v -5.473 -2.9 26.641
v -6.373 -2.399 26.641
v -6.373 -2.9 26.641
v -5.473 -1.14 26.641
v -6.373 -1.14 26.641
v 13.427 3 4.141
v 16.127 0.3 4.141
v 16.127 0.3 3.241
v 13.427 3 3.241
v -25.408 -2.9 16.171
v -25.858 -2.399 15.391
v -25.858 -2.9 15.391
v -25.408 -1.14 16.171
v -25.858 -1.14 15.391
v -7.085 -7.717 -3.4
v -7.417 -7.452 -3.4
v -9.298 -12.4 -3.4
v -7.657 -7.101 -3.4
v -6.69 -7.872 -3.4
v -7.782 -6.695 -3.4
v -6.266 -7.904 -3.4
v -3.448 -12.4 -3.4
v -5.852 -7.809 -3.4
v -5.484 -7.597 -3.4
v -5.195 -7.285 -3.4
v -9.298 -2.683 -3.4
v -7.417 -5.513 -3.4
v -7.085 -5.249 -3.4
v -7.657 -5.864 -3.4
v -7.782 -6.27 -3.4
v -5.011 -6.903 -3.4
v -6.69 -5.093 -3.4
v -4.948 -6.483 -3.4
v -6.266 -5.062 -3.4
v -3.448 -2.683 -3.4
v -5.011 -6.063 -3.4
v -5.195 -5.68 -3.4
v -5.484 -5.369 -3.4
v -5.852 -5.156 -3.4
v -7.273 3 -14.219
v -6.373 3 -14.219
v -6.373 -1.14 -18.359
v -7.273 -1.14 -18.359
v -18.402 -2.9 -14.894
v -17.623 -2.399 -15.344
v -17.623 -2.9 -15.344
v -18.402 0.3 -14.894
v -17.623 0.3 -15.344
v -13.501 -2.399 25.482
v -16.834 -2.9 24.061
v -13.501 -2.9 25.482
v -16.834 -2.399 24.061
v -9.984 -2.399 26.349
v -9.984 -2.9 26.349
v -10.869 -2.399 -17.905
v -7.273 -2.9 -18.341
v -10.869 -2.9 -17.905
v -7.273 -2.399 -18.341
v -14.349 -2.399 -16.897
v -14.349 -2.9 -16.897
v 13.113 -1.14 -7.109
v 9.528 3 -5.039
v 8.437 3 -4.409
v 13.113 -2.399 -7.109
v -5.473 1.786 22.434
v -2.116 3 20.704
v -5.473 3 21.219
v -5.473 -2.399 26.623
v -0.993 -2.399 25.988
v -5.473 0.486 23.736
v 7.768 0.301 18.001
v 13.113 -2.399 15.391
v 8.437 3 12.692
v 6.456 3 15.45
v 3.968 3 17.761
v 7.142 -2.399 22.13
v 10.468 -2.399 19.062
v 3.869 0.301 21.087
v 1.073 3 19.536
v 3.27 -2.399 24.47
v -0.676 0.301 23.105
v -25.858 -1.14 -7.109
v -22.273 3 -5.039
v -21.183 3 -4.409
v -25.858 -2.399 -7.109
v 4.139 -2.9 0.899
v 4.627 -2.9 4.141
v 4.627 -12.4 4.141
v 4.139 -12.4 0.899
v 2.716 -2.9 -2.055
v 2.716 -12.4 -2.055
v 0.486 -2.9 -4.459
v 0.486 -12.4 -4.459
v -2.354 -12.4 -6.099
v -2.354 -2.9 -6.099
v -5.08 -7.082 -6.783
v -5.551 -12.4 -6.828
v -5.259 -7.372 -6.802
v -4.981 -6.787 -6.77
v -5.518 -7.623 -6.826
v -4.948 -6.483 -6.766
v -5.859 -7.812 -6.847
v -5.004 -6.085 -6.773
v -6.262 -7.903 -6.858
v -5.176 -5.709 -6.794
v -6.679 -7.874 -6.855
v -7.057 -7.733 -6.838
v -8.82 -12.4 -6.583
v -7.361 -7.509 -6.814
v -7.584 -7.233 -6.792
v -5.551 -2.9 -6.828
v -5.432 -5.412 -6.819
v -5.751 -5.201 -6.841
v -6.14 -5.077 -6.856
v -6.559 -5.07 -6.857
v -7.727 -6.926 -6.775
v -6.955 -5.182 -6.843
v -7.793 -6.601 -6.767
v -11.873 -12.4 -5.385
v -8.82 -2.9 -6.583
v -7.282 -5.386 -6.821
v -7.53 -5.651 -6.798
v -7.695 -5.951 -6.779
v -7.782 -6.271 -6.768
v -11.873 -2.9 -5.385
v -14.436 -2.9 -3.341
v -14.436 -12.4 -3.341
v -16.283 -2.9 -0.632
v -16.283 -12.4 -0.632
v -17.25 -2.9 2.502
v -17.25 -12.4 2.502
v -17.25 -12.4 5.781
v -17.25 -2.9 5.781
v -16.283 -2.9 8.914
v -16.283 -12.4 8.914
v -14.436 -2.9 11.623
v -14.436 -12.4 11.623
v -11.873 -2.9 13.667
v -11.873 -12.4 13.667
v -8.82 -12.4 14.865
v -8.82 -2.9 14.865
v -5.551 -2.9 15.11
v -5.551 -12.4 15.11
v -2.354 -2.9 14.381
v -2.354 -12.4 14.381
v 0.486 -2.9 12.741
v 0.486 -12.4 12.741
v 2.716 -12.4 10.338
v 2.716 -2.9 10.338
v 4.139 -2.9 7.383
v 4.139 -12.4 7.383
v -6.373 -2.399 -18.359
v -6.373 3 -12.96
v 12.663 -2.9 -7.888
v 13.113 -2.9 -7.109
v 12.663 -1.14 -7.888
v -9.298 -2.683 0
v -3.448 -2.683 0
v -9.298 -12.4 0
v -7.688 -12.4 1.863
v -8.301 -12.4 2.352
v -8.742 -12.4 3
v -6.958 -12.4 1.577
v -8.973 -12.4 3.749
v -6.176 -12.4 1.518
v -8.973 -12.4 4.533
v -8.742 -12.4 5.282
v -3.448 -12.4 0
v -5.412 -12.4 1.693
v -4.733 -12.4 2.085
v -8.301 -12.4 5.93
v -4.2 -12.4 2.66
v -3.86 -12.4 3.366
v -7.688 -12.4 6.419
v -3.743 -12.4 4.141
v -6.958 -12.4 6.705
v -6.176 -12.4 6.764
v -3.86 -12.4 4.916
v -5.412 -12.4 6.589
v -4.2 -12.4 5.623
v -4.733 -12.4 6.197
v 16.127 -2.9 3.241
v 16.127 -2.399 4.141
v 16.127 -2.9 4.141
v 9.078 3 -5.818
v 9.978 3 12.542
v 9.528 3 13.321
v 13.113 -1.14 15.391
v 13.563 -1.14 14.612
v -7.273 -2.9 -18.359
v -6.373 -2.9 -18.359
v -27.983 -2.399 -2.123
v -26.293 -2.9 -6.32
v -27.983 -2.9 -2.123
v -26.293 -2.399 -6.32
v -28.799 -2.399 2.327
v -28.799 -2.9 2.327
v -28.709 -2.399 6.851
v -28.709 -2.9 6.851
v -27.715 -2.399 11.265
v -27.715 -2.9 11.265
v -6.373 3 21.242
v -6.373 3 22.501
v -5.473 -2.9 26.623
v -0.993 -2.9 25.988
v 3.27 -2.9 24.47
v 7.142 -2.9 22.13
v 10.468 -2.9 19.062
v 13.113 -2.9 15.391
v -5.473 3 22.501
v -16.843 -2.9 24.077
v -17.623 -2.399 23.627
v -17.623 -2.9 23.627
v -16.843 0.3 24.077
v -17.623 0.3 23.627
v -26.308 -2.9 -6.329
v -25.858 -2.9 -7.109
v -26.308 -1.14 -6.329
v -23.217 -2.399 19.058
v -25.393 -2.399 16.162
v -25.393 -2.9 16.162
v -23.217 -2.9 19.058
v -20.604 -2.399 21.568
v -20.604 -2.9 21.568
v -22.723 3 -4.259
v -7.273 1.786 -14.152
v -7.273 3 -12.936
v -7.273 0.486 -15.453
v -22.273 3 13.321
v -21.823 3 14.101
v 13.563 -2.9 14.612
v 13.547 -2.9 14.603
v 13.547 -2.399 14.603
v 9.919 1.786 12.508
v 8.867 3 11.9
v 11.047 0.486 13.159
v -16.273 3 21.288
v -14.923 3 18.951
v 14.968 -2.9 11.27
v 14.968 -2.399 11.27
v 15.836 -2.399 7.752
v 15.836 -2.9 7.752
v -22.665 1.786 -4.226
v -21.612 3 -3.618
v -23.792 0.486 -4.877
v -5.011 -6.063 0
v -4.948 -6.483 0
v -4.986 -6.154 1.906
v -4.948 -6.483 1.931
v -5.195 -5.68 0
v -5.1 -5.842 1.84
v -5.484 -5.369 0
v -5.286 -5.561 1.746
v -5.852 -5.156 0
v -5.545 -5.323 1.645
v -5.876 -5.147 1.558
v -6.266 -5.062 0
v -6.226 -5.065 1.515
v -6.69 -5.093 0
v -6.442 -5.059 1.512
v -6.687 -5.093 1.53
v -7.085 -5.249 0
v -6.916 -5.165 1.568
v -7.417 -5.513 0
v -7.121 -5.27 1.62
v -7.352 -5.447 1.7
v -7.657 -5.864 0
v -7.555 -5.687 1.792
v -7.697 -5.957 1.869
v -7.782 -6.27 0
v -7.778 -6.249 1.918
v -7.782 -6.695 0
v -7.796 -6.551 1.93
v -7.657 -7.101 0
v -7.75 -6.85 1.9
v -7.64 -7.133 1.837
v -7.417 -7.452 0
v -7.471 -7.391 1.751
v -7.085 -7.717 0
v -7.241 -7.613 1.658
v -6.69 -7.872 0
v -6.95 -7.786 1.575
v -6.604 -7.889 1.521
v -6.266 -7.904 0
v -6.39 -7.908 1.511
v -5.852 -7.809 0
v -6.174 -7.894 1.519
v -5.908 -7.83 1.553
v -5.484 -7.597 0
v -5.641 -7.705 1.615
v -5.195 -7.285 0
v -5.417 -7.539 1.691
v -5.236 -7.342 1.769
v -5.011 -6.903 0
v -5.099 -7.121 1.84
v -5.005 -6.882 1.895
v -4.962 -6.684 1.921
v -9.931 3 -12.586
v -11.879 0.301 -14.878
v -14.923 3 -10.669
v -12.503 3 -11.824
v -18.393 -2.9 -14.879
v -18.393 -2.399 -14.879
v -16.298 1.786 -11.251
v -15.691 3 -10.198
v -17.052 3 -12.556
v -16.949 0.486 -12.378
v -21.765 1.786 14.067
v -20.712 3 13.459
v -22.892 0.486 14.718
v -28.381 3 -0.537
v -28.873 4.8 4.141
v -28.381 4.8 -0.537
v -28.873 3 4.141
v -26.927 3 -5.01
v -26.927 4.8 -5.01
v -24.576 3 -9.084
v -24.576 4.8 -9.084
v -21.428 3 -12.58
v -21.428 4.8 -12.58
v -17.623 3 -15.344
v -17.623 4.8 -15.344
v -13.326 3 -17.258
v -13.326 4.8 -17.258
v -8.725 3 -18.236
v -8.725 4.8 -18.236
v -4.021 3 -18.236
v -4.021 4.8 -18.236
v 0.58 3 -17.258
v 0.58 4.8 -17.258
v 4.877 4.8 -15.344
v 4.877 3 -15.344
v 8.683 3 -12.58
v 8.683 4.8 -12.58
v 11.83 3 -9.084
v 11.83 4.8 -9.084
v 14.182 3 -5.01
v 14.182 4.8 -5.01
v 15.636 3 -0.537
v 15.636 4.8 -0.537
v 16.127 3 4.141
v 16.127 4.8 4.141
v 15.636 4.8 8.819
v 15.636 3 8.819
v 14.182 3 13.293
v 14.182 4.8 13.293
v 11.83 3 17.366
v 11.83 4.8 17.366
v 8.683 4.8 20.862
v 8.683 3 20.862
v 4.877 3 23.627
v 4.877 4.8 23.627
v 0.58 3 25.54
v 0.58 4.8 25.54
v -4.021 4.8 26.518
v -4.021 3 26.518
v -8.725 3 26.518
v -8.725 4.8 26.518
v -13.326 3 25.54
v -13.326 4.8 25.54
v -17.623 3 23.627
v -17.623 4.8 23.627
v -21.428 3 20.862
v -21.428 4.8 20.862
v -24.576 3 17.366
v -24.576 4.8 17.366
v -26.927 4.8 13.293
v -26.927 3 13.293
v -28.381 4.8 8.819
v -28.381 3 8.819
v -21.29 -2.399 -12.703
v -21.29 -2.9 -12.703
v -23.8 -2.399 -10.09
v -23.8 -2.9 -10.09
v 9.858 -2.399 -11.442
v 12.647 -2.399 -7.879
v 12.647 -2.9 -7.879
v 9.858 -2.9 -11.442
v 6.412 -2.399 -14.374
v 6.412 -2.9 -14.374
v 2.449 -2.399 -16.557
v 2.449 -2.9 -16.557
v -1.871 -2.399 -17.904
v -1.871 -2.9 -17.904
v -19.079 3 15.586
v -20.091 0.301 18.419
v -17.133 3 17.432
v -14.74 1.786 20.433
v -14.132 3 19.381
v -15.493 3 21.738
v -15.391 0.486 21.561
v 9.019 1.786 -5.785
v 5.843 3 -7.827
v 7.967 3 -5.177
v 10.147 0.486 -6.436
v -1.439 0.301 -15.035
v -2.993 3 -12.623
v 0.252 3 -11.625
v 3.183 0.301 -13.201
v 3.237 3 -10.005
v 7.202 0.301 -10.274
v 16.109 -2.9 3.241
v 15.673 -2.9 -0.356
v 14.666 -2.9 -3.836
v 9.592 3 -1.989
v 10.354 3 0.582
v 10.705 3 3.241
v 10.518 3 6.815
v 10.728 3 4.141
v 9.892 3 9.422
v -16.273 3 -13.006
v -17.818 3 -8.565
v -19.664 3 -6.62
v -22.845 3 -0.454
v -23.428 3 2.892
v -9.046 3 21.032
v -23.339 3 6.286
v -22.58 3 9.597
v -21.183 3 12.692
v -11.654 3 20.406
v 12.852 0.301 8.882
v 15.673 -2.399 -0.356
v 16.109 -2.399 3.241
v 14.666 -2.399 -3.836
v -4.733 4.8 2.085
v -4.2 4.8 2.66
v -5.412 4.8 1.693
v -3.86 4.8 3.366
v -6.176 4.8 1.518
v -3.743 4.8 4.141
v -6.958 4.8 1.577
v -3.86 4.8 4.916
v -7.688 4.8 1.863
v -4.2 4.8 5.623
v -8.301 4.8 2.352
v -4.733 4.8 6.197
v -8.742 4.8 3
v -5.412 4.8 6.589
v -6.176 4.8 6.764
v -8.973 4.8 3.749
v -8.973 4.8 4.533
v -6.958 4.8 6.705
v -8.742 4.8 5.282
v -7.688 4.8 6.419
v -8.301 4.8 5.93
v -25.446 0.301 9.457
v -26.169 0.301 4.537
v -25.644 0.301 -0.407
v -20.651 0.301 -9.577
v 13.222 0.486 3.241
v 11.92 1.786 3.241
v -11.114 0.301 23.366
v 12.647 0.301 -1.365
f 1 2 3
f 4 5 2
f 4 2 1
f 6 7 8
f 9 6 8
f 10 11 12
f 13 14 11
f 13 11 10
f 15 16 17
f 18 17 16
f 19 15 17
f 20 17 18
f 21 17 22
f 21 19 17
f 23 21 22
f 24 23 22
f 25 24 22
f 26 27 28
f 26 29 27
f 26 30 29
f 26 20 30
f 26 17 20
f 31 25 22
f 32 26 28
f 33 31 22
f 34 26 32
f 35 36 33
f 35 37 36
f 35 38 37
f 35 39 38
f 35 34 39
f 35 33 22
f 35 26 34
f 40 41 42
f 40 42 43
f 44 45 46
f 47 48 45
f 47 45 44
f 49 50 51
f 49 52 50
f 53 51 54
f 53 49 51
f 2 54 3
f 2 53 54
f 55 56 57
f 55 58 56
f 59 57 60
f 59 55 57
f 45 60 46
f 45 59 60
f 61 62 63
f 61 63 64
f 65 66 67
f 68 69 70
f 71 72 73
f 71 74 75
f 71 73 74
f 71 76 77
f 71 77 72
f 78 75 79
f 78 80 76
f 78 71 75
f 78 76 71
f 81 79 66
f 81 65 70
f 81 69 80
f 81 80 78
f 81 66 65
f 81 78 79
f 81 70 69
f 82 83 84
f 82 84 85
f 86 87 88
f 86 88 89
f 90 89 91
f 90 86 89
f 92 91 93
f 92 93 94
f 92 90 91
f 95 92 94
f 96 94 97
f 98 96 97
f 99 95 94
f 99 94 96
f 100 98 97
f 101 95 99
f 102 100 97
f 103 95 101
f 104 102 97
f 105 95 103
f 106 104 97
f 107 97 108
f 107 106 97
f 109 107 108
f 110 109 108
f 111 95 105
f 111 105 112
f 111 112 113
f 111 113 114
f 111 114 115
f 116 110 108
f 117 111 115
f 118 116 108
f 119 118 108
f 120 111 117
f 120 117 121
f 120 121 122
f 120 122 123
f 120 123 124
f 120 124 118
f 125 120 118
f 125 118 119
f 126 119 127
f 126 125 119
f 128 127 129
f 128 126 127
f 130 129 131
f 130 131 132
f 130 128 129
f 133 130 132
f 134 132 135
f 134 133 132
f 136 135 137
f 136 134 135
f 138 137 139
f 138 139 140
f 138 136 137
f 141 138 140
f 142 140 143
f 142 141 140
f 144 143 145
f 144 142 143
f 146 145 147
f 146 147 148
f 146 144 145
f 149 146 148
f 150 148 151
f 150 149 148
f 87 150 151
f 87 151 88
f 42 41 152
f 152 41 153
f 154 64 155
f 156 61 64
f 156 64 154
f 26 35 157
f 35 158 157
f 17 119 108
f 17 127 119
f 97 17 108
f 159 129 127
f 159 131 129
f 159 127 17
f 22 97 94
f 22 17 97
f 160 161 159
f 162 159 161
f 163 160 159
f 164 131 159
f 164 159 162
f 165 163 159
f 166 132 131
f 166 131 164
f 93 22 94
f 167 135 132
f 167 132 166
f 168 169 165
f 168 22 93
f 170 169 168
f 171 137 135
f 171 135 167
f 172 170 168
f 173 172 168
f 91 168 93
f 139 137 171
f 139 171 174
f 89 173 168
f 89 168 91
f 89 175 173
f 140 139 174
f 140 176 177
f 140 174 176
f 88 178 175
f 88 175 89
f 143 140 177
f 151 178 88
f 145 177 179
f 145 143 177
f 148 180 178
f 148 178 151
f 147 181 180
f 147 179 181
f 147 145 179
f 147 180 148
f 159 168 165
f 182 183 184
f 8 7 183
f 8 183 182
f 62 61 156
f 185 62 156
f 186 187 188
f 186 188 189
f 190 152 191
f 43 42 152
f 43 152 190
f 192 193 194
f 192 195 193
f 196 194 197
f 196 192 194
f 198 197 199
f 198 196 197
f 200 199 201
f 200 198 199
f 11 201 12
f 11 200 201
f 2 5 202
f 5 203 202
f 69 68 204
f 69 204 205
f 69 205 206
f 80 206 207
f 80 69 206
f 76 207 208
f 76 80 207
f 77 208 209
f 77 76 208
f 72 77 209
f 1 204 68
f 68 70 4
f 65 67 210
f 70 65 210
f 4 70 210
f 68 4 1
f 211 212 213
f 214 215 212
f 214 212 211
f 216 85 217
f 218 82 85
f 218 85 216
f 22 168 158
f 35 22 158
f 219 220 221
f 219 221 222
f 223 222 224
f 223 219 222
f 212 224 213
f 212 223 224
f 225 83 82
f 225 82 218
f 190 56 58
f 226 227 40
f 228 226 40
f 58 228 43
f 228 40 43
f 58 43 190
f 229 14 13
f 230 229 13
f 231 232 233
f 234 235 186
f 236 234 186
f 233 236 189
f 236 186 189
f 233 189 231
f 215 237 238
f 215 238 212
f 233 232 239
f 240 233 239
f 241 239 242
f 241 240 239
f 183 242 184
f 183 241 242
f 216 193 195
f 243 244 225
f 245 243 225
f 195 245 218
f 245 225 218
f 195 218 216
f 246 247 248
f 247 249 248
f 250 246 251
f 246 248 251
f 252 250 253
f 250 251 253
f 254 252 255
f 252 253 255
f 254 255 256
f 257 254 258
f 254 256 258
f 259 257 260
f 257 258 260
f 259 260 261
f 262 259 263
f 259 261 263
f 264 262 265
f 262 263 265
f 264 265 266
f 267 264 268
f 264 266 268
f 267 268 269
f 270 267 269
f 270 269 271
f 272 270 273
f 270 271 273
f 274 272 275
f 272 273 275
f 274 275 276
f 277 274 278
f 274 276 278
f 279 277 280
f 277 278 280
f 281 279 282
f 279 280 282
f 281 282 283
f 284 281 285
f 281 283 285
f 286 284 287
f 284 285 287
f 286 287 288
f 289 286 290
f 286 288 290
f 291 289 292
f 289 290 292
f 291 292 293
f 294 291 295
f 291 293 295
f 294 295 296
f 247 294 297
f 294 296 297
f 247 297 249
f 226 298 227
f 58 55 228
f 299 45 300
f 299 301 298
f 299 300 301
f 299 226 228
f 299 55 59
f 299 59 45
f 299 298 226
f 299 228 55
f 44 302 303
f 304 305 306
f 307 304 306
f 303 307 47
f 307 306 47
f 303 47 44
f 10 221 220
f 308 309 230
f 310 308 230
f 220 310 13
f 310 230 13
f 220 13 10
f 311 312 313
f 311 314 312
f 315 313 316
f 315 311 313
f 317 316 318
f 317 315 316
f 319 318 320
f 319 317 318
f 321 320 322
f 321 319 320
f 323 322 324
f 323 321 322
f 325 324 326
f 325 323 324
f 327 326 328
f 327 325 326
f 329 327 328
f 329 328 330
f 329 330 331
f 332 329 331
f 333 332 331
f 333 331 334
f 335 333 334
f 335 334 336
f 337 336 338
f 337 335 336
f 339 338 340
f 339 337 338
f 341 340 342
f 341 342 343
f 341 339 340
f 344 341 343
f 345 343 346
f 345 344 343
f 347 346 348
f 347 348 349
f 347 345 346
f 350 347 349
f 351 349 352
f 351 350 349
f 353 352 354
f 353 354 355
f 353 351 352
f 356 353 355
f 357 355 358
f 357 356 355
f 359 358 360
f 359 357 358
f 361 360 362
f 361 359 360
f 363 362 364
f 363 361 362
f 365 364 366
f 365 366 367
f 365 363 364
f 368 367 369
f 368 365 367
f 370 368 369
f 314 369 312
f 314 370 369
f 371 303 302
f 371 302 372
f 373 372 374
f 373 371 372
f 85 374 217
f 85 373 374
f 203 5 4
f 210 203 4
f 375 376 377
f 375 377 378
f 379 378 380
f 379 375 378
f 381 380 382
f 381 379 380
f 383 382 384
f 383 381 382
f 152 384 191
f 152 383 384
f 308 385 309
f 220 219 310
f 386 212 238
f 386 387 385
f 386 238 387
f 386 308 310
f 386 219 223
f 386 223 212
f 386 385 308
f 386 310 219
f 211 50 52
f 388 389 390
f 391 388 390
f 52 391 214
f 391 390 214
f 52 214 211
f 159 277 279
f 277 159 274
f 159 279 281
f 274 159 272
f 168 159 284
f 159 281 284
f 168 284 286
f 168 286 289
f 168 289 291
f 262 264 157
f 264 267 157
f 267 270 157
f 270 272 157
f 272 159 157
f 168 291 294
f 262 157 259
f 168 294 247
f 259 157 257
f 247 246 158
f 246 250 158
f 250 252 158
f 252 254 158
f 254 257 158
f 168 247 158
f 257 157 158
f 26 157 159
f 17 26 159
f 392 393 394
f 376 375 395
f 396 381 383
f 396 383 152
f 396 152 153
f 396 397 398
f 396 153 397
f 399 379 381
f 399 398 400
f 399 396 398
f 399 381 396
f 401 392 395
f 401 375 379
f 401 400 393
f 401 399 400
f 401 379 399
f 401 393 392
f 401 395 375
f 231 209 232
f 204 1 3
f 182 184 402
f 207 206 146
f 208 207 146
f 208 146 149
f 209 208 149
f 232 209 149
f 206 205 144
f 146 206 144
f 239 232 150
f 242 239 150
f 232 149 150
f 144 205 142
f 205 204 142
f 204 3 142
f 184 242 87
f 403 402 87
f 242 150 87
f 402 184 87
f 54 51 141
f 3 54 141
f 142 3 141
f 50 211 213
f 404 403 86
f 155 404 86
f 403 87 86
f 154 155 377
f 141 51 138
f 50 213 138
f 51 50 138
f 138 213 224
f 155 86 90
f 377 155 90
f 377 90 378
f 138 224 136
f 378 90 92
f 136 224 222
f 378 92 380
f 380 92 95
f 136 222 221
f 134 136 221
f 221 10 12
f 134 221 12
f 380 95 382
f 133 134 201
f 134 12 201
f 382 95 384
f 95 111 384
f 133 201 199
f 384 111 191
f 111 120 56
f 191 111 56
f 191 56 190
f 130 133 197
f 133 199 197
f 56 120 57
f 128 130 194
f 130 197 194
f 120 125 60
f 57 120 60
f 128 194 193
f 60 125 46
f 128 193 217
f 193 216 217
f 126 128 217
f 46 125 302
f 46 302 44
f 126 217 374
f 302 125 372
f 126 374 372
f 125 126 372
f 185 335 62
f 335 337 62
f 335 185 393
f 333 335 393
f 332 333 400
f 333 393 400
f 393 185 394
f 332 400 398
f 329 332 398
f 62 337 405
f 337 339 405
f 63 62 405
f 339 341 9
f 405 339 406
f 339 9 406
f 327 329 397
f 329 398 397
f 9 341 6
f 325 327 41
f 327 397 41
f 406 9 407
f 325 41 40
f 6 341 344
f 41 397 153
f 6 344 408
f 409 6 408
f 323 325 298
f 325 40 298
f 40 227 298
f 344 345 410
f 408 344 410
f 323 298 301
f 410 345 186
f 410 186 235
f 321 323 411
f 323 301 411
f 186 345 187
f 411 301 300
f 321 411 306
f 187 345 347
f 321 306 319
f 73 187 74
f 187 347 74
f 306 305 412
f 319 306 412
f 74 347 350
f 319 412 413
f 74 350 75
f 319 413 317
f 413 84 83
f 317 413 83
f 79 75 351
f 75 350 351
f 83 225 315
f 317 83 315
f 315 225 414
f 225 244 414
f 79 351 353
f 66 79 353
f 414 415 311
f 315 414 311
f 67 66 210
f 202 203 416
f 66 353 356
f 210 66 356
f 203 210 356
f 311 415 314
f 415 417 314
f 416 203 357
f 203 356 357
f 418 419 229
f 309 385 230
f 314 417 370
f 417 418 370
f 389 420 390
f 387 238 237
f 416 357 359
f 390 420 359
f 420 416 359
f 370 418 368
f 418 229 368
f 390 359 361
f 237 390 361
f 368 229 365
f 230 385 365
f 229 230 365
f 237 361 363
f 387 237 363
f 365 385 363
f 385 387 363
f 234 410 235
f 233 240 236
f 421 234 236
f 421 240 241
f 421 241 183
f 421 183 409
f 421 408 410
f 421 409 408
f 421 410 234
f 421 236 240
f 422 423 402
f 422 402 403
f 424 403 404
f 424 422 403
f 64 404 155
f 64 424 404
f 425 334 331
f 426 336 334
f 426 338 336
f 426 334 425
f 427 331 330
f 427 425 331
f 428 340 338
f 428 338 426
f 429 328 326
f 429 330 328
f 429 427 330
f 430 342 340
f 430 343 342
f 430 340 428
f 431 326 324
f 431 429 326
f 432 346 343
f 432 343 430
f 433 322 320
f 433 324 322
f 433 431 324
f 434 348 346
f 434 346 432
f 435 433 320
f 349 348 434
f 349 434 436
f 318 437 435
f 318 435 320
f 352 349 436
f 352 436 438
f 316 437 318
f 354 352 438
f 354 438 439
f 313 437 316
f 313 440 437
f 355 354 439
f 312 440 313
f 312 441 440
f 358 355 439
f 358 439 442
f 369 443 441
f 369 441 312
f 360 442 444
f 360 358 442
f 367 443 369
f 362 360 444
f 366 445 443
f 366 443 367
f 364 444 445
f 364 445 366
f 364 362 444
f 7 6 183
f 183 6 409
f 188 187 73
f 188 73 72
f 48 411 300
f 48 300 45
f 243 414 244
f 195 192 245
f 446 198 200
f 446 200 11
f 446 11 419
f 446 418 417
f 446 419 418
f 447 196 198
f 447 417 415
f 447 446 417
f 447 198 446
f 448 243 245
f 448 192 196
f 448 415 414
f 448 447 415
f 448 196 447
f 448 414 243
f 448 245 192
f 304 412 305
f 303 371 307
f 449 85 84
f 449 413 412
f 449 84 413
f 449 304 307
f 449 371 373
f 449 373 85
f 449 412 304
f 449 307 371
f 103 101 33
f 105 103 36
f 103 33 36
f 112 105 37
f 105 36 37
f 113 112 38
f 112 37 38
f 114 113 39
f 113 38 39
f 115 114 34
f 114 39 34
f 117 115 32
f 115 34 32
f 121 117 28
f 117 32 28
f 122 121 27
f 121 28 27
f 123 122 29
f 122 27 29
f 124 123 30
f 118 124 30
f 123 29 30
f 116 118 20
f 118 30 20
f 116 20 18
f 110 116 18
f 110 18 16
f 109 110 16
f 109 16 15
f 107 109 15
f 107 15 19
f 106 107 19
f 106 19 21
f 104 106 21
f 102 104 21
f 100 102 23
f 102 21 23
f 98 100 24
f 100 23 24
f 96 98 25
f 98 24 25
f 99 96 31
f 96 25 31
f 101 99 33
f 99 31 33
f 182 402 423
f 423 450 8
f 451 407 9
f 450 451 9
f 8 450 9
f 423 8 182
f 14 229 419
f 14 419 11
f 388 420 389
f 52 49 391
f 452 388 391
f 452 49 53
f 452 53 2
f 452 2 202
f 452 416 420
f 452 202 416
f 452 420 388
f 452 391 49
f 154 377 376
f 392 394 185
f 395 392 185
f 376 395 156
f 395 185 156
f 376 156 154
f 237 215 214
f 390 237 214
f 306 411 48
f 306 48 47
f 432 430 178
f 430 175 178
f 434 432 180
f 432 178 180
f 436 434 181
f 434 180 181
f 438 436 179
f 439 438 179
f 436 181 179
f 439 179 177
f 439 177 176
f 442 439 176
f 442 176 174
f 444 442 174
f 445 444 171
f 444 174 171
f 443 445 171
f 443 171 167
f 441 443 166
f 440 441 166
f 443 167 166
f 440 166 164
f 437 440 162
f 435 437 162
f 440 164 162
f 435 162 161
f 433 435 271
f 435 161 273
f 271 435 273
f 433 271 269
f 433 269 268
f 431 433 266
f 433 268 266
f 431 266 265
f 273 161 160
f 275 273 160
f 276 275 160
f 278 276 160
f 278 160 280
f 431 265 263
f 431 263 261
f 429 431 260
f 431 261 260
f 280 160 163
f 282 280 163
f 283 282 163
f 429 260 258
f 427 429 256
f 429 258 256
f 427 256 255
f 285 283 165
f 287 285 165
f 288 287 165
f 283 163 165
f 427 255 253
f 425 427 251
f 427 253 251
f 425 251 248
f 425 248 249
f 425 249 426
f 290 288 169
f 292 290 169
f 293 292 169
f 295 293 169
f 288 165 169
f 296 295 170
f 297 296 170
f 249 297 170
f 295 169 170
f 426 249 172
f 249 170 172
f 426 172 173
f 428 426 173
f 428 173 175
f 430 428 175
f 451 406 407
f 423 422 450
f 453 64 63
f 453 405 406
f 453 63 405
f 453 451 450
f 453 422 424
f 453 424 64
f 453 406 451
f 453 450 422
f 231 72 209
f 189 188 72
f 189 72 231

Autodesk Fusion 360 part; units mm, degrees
sketch "Sketch1" plane through (0, 0, 0) normal (0, 1, 0) x (1, 0, 0)
  circle A0 centre (0, 0) radius 12.5
  dimension "d1" = 25
extrude "Extrude1" add sketch "Sketch1" along normal blind 3 makes body 1
chamfer "Chamfer1" distance 3 angle 45 1 edges at (-11.6541, 3, 4.5202) on bodies 1
sketch "Sketch2" plane through (0, 3, 0) normal (0, 1, 0) x (-1, 0, 0)
  circle A0 centre (0, 0) radius 9.5
  circle A1 centre (0, 0) radius 12.5
  dimension "d5" = 25
extrude "Extrude2" add sketch "Sketch2" along normal blind 1 contours A0 | A1 bodies 1
sketch "Sketch3" plane through (0, 0, 0) normal (0, 0, 1) x (1, 0, 0)
  line L0 (0, 0) -> (0.5, 0)
  line L1 (0.5, 0) -> (0.5, 3)
  line L2 (0.5, 3) -> (0, 3)
  line L3 (0, 3) -> (0, 0)
  line L4 (12.5, 3) -> (-12.5, 3)
extrude "Extrude3" add sketch "Sketch3" along normal blind 12.5 separate body makes body 2
chamfer "Chamfer2" distance 2.3 angle 45 1 edges at (0.25, 3, 12.5) on bodies 2
pattern_circular "C-Pattern1" count 6 over 360 about axis through (0, 0, 0) along (0, 1, 0) of bodies 2 makes body 3 at (6.5529, 1, 3.7833) makes body 4 at (6.3029, 1, -4.2163) makes body 5 at (0, 1, -7.5667) makes body 6 at (-6.5529, 1, -3.7833) makes body 7 at (-6.5529, 1, 3.7833)
sketch "Sketch4" plane through (0, 0, 0) normal (0, 0, 1) x (1, 0, 0)
sketch "Sketch5" plane through (0, 0, 0) normal (1, 0, 0) x (0, 0, -1)
  line L0 (0, 0) -> (0.5, 0)
  line L1 (0.5, 0) -> (0.5, 3)
  line L2 (0.5, 3) -> (0, 3)
  line L3 (0, 3) -> (0, 0)
  line L4 (-0.433, 3) -> (4.667, 3)
extrude "Extrude4" add sketch "Sketch5" along normal blind 12.5 separate body makes body 8
chamfer "Chamfer3" distance 1.5 angle 45 1 edges at (12.5, 3, -0.25) on bodies 8
pattern_circular "C-Pattern2" count 3 over 360 about axis through (0, 0, 0) along (0, 1, 0) of bodies 8 makes body 9 at (-4.3497, 1, -6.5339) makes body 10 at (-3.9167, 1, 6.7839)
combine "Combine1" operation add target body 1 tool bodies 7 10 2 6 9 5 4 8 3
sketch "Sketch6" plane through (0, 0, 0) normal (0, -1, 0) x (1, 0, 0)
  arc A0 (10.8253, 6.25) -> (0.5, 12.49) centre (0, 0) ccw
  line L0 (0.5, 12.49) -> (0.5, 12.5)
  line L1 (0.5, 12.5) -> (0, 12.5)
  arc A1 (0, 12.5) -> (-5.812, 11.0667) centre (0, 0) ccw
  line L2 (-5.812, 11.0667) -> (-5.817, 11.0753)
  line L3 (-5.817, 11.0753) -> (-6.25, 10.8253)
  arc A2 (-6.25, 10.8253) -> (-10.5667, 6.678) centre (0, 0) ccw
  line L4 (-10.5667, 6.678) -> (-10.5753, 6.683)
  line L5 (-10.5753, 6.683) -> (-10.8253, 6.25)
  arc A3 (-10.8253, 6.25) -> (-11.0667, -5.812) centre (0, 0) ccw
  line L6 (-11.0667, -5.812) -> (-11.0753, -5.817)
  line L7 (-11.0753, -5.817) -> (-10.8253, -6.25)
  arc A4 (-10.8253, -6.25) -> (-6.678, -10.5667) centre (0, 0) ccw
  line L8 (-6.678, -10.5667) -> (-6.683, -10.5753)
  line L9 (-6.683, -10.5753) -> (-6.25, -10.8253)
  arc A5 (-6.25, -10.8253) -> (-0.5, -12.49) centre (0, 0) ccw
  line L10 (-0.5, -12.49) -> (-0.5, -12.5)
  line L11 (-0.5, -12.5) -> (0, -12.5)
  arc A6 (0, -12.5) -> (10.5667, -6.678) centre (0, 0) ccw
  line L12 (10.5667, -6.678) -> (10.5753, -6.683)
  line L13 (10.5753, -6.683) -> (10.8253, -6.25)
  arc A7 (10.8253, -6.25) -> (12.49, -0.5) centre (0, 0) ccw
  line L14 (12.49, -0.5) -> (12.5, -0.5)
  line L15 (12.5, -0.5) -> (12.5, 0)
  arc A8 (12.5, 0) -> (11.0667, 5.812) centre (0, 0) ccw
  line L16 (11.0667, 5.812) -> (11.0753, 5.817)
  line L17 (11.0753, 5.817) -> (10.8253, 6.25)
scale "Scale1" factor 1.8 about (7.9658, 3, -5.1764) bodies 1
sketch "Sketch7" plane through (0, -2.4, 0) normal (0, -1, 0) x (1, 0, 0)
  arc A0 (13.1129, 15.3911) -> (-5.4727, 26.6231) centre (-6.3727, 4.1411) ccw
  line L0 (-5.4727, 26.6231) -> (-5.4727, 26.6411)
  line L1 (-5.4727, 26.6411) -> (-6.3727, 26.6411)
  arc A1 (-6.3727, 26.6411) -> (-16.8342, 24.0611) centre (-6.3727, 4.1411) ccw
  line L2 (-16.8342, 24.0611) -> (-16.8432, 24.0767)
  line L3 (-16.8432, 24.0767) -> (-17.6227, 23.6267)
  arc A2 (-17.6227, 23.6267) -> (-25.3926, 16.1616) centre (-6.3727, 4.1411) ccw
  line L4 (-25.3926, 16.1616) -> (-25.4082, 16.1706)
  line L5 (-25.4082, 16.1706) -> (-25.8582, 15.3911)
  arc A3 (-25.8582, 15.3911) -> (-26.2926, -6.3204) centre (-6.3727, 4.1411) ccw
  line L6 (-26.2926, -6.3204) -> (-26.3082, -6.3294)
  line L7 (-26.3082, -6.3294) -> (-25.8582, -7.1089)
  arc A4 (-25.8582, -7.1089) -> (-18.3931, -14.8788) centre (-6.3727, 4.1411) ccw
  line L8 (-18.3931, -14.8788) -> (-18.4021, -14.8944)
  line L9 (-18.4021, -14.8944) -> (-17.6227, -15.3444)
  arc A5 (-17.6227, -15.3444) -> (-7.2727, -18.3408) centre (-6.3727, 4.1411) ccw
  line L10 (-7.2727, -18.3408) -> (-7.2727, -18.3589)
  line L11 (-7.2727, -18.3589) -> (-6.3727, -18.3589)
  arc A6 (-6.3727, -18.3589) -> (12.6473, -7.8793) centre (-6.3727, 4.1411) ccw
  line L12 (12.6473, -7.8793) -> (12.6629, -7.8883)
  line L13 (12.6629, -7.8883) -> (13.1129, -7.1089)
  arc A7 (13.1129, -7.1089) -> (16.1093, 3.2411) centre (-6.3727, 4.1411) ccw
  line L14 (16.1093, 3.2411) -> (16.1273, 3.2411)
  line L15 (16.1273, 3.2411) -> (16.1273, 4.1411)
  arc A8 (16.1273, 4.1411) -> (13.5473, 14.6027) centre (-6.3727, 4.1411) ccw
  line L16 (13.5473, 14.6027) -> (13.5629, 14.6117)
  line L17 (13.5629, 14.6117) -> (13.1129, 15.3911)
  circle A9 centre (-6.3727, 4.1411) radius 7.5
  dimension "d19" = 15
extrude "Extrude5" add sketch "Sketch7" along normal blind 10 contours A9 bodies 1
sketch "Sketch8" plane through (0, -12.4, 0) normal (0, -1, 0) x (1, 0, 0)
  circle A0 centre (-6.3727, 4.1411) radius 7.5
  circle A1 centre (-6.3727, 4.1411) radius 2.5
  dimension "d22" = 5
extrude "Extrude6" cut sketch "Sketch8" against normal blind 100 contours A1 bodies 1
sketch "Sketch9" plane through (0, 0, 0) normal (0, 0, 1) x (1, 0, 0)
  circle A0 centre (-6.3727, -6.4827) radius 1.375
  dimension "d25" = 2.75
extrude "Extrude7" add sketch "Sketch9" against normal blind 10 separate body makes body 11
move_body "Move1" bodies 11 to x (1, 0, 0) y (0, 1, 0) z (0, 0, 1) at (0, 0, 4)
combine "Combine2" operation cut target body 1 tool bodies 11
extrude "Extrude8" add 1 faces at (-5.1104, -2.4, -13.2744) along direction (0, -1, 0) blind 0.5 on bodies 1 bodies 1
move_face "OffsetFaces1" offset 3.5 1 faces at (-8.6648, -7.2979, -3) on bodies 1
move_face "OffsetFaces2" offset -0.13 1 faces at (-3.8851, -6.6667, 3.8922) on bodies 1
move_face "OffsetFaces3" offset -0.05 1 faces at (-5.2578, -5.6779, -3.9485) on bodies 1
sketch "Sketch10" plane through (0, 0, 0) normal (0, 0, 1) x (1, 0, 0)
  line L0 (-6.3727, -2.9) -> (12.6473, -2.9)
  line L1 (-3.4477, -6.4827) -> (-3.4477, -2.6827)
  line L2 (-9.2977, -6.4827) -> (-9.2977, -10.2827)
  line L3 (-9.2977, -10.2827) -> (-3.4477, -10.2827)
  line L4 (-3.4477, -10.2827) -> (-3.4477, -2.6827)
  line L5 (-3.4477, -2.6827) -> (-9.2977, -2.6827)
  line L6 (-9.2977, -2.6827) -> (-9.2977, -10.2827)
  dimension "d33" = 1.5
  dimension "d34" = 1.5
  dimension "d36" = 3.8
extrude "Extrude9" add sketch "Sketch10" against normal blind 3.4 separate body makes body 12
extrude "Extrude10" add 1 faces at (-7.3477, -10.2827, -1.1333) along direction (0, -1, 0) blind 5 on bodies 12 bodies 12
combine "Combine3" operation cut target body 1 tool bodies 12 keep tools
hidden bodies 12
